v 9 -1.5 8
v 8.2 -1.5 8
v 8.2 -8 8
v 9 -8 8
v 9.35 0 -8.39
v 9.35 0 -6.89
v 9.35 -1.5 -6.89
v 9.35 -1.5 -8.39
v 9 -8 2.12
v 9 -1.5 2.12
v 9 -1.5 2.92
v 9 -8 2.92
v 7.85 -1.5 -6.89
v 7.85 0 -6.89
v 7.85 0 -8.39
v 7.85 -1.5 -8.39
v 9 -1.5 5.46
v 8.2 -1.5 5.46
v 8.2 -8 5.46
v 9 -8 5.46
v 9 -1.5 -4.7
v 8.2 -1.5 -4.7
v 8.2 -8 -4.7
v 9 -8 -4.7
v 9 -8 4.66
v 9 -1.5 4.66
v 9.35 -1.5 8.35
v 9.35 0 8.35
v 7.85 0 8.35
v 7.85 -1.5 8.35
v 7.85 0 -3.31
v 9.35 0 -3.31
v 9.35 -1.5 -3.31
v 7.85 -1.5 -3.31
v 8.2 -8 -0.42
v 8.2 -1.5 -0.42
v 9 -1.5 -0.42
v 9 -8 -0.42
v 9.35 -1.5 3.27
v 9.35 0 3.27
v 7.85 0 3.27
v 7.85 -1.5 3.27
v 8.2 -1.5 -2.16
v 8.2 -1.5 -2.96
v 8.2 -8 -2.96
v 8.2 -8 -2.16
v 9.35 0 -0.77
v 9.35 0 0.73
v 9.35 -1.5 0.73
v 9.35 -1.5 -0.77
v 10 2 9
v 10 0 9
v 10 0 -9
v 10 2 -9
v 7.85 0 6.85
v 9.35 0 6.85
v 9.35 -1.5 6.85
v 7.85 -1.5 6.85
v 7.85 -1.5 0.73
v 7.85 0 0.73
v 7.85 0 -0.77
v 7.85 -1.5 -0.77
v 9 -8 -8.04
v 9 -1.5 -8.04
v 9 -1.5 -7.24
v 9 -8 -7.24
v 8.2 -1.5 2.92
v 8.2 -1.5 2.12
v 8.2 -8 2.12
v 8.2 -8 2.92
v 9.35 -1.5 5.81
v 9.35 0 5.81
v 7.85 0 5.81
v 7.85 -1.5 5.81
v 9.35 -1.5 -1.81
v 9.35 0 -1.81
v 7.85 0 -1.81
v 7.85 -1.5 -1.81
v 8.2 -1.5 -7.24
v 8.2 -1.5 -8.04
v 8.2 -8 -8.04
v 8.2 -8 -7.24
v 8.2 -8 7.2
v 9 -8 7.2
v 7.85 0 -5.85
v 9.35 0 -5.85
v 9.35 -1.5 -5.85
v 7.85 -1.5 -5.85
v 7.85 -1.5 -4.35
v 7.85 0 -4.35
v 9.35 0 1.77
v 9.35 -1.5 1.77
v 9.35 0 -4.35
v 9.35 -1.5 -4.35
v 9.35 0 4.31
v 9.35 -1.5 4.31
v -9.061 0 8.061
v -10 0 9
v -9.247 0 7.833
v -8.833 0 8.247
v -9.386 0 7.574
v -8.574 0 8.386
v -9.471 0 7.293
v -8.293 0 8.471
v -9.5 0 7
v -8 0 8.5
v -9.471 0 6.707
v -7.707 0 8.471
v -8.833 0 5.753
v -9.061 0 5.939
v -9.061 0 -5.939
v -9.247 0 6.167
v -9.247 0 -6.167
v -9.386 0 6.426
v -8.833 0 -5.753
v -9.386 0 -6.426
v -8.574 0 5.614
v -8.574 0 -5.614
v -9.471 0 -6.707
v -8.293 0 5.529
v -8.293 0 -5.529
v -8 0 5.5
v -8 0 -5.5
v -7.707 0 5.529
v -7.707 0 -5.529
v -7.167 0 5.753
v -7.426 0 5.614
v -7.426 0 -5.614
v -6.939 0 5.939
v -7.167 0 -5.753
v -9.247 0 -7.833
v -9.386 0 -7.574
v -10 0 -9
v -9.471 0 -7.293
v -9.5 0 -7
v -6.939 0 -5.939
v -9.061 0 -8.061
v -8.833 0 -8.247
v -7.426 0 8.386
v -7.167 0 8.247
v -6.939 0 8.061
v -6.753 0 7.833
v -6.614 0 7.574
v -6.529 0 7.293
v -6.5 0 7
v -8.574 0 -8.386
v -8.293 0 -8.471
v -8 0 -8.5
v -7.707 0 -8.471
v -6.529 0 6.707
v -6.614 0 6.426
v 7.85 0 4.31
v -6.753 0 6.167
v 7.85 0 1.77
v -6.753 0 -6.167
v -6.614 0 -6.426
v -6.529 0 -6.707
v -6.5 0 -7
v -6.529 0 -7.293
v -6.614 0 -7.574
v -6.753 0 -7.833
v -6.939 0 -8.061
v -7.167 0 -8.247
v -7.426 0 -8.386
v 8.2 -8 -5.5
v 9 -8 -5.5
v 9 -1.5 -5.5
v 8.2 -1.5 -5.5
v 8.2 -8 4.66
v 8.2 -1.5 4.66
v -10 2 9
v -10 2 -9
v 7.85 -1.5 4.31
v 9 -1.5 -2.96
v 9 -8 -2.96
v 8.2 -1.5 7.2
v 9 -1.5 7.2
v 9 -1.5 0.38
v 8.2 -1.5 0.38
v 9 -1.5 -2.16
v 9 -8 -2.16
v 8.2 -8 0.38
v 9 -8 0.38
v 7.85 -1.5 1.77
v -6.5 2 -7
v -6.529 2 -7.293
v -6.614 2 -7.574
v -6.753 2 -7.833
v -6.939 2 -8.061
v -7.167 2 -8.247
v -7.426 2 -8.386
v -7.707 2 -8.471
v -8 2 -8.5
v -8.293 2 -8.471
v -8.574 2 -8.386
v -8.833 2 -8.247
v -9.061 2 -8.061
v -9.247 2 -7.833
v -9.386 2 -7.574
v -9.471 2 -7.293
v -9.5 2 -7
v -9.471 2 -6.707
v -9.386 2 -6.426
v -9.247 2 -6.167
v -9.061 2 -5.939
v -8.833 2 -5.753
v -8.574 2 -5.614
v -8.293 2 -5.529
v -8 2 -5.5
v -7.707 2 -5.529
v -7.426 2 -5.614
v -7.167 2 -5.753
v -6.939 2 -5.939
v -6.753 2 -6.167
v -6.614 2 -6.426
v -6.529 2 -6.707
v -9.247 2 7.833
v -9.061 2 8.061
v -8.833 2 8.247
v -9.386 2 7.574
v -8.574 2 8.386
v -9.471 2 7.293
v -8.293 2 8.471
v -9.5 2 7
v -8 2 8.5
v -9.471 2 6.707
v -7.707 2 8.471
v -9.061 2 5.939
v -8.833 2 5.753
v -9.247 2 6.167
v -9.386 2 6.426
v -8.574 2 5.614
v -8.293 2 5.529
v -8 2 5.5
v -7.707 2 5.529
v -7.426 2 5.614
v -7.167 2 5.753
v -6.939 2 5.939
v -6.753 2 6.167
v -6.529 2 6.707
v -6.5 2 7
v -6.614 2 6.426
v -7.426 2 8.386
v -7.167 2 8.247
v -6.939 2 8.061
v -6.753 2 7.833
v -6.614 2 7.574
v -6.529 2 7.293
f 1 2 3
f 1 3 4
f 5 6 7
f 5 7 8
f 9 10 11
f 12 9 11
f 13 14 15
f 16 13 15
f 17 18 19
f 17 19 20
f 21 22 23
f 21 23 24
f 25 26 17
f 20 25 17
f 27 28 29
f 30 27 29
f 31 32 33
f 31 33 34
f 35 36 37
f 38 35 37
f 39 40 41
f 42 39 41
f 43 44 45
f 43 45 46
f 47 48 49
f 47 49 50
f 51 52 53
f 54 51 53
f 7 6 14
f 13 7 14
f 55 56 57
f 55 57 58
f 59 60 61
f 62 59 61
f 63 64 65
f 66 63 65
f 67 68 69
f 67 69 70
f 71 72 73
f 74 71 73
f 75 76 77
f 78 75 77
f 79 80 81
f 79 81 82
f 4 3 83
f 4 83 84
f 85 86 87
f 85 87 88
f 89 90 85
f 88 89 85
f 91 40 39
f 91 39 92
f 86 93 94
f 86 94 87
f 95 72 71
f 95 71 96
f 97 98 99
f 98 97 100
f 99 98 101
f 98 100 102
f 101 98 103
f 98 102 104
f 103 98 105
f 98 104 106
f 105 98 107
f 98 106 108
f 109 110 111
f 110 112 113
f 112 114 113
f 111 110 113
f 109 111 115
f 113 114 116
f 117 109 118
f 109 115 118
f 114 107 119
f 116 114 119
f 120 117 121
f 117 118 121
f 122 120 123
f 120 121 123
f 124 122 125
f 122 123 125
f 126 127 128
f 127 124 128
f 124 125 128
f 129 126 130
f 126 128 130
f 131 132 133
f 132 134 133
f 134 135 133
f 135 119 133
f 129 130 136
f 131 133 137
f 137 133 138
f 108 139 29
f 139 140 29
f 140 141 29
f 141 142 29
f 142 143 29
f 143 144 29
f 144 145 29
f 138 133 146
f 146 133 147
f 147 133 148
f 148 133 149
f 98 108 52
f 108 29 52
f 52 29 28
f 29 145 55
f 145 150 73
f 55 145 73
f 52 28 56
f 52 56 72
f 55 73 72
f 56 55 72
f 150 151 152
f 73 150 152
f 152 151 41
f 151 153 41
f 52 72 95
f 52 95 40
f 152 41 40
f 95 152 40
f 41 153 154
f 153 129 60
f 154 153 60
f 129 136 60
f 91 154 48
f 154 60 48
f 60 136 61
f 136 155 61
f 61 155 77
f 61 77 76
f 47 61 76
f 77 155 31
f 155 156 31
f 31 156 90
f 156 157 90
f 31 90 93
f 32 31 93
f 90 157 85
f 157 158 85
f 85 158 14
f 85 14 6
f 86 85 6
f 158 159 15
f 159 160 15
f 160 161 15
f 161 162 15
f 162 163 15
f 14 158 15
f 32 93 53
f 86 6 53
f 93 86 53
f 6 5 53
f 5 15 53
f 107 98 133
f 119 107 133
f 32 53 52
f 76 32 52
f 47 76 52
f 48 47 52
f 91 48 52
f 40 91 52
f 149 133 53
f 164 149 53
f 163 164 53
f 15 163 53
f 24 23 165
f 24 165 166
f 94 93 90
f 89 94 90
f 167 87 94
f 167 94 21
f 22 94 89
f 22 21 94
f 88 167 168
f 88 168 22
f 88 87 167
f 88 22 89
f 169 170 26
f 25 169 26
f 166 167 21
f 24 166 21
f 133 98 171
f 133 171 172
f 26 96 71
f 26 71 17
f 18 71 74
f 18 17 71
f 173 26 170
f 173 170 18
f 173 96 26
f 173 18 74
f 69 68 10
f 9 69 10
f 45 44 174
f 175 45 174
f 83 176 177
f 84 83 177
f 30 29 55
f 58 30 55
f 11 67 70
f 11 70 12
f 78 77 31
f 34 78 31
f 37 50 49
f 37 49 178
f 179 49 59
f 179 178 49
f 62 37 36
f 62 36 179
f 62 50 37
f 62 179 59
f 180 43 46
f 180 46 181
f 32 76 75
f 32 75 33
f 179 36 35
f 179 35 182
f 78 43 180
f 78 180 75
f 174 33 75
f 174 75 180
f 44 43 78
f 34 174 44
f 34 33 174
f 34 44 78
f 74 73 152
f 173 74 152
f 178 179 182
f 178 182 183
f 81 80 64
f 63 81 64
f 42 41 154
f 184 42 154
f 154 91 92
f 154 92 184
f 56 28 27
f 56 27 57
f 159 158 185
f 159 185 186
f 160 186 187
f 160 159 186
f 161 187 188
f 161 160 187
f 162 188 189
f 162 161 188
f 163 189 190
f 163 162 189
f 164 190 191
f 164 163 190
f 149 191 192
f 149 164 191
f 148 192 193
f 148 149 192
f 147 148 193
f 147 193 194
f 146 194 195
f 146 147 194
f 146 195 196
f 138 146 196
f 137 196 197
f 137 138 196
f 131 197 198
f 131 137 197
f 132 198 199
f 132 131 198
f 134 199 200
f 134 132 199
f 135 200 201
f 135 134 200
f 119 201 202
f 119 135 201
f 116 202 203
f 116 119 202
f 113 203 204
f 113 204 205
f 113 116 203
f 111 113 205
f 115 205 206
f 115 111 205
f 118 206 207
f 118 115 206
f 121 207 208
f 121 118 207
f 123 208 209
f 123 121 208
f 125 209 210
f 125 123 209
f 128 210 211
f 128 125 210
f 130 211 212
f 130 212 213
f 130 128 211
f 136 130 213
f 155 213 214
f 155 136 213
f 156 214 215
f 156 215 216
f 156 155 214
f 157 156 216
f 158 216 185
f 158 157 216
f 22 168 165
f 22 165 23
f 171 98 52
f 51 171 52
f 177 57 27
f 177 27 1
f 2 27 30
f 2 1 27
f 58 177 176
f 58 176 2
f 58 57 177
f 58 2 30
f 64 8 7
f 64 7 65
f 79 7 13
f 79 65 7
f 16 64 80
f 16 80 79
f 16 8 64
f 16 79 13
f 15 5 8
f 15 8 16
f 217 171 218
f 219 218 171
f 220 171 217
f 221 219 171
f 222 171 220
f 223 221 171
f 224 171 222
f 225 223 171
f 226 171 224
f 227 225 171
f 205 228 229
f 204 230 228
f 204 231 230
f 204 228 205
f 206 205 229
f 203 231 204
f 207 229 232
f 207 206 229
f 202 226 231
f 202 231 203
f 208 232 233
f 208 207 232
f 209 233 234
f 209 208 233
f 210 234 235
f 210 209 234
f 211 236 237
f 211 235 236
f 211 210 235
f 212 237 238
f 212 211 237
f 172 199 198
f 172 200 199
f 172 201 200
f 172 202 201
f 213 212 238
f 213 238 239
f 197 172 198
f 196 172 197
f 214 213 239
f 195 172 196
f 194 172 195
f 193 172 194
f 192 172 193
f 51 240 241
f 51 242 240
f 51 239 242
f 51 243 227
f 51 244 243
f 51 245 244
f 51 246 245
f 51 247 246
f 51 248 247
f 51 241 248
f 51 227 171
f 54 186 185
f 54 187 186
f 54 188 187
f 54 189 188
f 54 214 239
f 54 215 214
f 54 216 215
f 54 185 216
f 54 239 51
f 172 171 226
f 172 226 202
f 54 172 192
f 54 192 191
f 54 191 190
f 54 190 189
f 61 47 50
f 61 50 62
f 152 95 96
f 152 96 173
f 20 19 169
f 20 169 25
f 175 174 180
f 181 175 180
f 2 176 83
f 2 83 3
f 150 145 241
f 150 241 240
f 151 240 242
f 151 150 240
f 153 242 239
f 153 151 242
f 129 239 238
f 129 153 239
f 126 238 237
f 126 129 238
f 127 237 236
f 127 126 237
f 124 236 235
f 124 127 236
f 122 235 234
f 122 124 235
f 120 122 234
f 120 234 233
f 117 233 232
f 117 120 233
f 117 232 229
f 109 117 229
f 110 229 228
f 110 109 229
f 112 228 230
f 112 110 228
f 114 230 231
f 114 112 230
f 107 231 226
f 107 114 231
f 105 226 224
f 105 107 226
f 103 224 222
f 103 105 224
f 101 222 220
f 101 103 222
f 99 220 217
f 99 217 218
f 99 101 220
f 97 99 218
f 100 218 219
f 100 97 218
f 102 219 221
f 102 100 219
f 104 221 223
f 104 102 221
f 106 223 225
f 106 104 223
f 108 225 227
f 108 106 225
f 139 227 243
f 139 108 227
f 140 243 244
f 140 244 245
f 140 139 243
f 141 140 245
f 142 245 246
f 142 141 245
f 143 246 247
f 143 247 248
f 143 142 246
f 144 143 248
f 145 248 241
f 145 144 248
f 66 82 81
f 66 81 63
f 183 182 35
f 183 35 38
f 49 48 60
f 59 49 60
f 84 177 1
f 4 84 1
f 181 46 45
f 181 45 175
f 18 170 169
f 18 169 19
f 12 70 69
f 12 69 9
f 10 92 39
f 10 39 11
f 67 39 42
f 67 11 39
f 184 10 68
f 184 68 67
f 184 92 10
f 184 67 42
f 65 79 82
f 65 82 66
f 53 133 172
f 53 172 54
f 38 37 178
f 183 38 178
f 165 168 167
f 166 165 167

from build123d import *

# Parameters (mm, degrees)
SKIZZE1_W                       = 20
SKIZZE1_H                       = 18
SKIZZE1_R                       = 1.5
AUFSATZ_LINEAR_AUSTRAGEN1_DEPTH = 2
SKIZZE2_W                       = 0.8
SKIZZE2_H                       = 0.8
AUFSATZ_LINEAR_AUSTRAGEN2_DEPTH = 8
SKIZZE3_W                       = 1.5
SKIZZE3_H                       = 1.5
AUFSATZ_LINEAR_AUSTRAGEN3_DEPTH = 1.5
LINEARES_MUSTER1_COUNT          = 7
LINEARES_MUSTER1_PITCH          = 2.54


with BuildPart() as part:
    # Skizze1 → Aufsatz-Linear austragen1 (new body)
    with BuildSketch(Plane(origin=(0, 0, 0), x_dir=(1, 0, 0), z_dir=(0, 1, 0))):
        Rectangle(SKIZZE1_W, SKIZZE1_H)
        with Locations((-8, -7)):
            Circle(SKIZZE1_R, mode=Mode.SUBTRACT)
        with Locations((-8, 7)):
            Circle(SKIZZE1_R, mode=Mode.SUBTRACT)
    extrude(amount=AUFSATZ_LINEAR_AUSTRAGEN1_DEPTH)

    # Skizze2 → Aufsatz-Linear austragen2 (add)
    with BuildSketch(Plane.XZ):
        with Locations((8.6, 7.6)):
            Rectangle(SKIZZE2_W, SKIZZE2_H)
    aufsatz_linear_austragen2 = extrude(amount=AUFSATZ_LINEAR_AUSTRAGEN2_DEPTH)

    # Skizze3 → Aufsatz-Linear austragen3 (add)
    with BuildSketch(Plane(origin=(0, 0, 0), x_dir=(-1, 0, 0), z_dir=(0, -1, 0))):
        with Locations((-8.6, -7.6)):
            Rectangle(SKIZZE3_W, SKIZZE3_H)
    aufsatz_linear_austragen3 = extrude(amount=AUFSATZ_LINEAR_AUSTRAGEN3_DEPTH)

    # Lineares Muster1: Aufsatz-Linear austragen2, Aufsatz-Linear austragen3 ×7
    with Locations(*[(0, 0, -i * LINEARES_MUSTER1_PITCH) for i in range(1, LINEARES_MUSTER1_COUNT)]):
        add(aufsatz_linear_austragen2)
        add(aufsatz_linear_austragen3)


solid = part.part
